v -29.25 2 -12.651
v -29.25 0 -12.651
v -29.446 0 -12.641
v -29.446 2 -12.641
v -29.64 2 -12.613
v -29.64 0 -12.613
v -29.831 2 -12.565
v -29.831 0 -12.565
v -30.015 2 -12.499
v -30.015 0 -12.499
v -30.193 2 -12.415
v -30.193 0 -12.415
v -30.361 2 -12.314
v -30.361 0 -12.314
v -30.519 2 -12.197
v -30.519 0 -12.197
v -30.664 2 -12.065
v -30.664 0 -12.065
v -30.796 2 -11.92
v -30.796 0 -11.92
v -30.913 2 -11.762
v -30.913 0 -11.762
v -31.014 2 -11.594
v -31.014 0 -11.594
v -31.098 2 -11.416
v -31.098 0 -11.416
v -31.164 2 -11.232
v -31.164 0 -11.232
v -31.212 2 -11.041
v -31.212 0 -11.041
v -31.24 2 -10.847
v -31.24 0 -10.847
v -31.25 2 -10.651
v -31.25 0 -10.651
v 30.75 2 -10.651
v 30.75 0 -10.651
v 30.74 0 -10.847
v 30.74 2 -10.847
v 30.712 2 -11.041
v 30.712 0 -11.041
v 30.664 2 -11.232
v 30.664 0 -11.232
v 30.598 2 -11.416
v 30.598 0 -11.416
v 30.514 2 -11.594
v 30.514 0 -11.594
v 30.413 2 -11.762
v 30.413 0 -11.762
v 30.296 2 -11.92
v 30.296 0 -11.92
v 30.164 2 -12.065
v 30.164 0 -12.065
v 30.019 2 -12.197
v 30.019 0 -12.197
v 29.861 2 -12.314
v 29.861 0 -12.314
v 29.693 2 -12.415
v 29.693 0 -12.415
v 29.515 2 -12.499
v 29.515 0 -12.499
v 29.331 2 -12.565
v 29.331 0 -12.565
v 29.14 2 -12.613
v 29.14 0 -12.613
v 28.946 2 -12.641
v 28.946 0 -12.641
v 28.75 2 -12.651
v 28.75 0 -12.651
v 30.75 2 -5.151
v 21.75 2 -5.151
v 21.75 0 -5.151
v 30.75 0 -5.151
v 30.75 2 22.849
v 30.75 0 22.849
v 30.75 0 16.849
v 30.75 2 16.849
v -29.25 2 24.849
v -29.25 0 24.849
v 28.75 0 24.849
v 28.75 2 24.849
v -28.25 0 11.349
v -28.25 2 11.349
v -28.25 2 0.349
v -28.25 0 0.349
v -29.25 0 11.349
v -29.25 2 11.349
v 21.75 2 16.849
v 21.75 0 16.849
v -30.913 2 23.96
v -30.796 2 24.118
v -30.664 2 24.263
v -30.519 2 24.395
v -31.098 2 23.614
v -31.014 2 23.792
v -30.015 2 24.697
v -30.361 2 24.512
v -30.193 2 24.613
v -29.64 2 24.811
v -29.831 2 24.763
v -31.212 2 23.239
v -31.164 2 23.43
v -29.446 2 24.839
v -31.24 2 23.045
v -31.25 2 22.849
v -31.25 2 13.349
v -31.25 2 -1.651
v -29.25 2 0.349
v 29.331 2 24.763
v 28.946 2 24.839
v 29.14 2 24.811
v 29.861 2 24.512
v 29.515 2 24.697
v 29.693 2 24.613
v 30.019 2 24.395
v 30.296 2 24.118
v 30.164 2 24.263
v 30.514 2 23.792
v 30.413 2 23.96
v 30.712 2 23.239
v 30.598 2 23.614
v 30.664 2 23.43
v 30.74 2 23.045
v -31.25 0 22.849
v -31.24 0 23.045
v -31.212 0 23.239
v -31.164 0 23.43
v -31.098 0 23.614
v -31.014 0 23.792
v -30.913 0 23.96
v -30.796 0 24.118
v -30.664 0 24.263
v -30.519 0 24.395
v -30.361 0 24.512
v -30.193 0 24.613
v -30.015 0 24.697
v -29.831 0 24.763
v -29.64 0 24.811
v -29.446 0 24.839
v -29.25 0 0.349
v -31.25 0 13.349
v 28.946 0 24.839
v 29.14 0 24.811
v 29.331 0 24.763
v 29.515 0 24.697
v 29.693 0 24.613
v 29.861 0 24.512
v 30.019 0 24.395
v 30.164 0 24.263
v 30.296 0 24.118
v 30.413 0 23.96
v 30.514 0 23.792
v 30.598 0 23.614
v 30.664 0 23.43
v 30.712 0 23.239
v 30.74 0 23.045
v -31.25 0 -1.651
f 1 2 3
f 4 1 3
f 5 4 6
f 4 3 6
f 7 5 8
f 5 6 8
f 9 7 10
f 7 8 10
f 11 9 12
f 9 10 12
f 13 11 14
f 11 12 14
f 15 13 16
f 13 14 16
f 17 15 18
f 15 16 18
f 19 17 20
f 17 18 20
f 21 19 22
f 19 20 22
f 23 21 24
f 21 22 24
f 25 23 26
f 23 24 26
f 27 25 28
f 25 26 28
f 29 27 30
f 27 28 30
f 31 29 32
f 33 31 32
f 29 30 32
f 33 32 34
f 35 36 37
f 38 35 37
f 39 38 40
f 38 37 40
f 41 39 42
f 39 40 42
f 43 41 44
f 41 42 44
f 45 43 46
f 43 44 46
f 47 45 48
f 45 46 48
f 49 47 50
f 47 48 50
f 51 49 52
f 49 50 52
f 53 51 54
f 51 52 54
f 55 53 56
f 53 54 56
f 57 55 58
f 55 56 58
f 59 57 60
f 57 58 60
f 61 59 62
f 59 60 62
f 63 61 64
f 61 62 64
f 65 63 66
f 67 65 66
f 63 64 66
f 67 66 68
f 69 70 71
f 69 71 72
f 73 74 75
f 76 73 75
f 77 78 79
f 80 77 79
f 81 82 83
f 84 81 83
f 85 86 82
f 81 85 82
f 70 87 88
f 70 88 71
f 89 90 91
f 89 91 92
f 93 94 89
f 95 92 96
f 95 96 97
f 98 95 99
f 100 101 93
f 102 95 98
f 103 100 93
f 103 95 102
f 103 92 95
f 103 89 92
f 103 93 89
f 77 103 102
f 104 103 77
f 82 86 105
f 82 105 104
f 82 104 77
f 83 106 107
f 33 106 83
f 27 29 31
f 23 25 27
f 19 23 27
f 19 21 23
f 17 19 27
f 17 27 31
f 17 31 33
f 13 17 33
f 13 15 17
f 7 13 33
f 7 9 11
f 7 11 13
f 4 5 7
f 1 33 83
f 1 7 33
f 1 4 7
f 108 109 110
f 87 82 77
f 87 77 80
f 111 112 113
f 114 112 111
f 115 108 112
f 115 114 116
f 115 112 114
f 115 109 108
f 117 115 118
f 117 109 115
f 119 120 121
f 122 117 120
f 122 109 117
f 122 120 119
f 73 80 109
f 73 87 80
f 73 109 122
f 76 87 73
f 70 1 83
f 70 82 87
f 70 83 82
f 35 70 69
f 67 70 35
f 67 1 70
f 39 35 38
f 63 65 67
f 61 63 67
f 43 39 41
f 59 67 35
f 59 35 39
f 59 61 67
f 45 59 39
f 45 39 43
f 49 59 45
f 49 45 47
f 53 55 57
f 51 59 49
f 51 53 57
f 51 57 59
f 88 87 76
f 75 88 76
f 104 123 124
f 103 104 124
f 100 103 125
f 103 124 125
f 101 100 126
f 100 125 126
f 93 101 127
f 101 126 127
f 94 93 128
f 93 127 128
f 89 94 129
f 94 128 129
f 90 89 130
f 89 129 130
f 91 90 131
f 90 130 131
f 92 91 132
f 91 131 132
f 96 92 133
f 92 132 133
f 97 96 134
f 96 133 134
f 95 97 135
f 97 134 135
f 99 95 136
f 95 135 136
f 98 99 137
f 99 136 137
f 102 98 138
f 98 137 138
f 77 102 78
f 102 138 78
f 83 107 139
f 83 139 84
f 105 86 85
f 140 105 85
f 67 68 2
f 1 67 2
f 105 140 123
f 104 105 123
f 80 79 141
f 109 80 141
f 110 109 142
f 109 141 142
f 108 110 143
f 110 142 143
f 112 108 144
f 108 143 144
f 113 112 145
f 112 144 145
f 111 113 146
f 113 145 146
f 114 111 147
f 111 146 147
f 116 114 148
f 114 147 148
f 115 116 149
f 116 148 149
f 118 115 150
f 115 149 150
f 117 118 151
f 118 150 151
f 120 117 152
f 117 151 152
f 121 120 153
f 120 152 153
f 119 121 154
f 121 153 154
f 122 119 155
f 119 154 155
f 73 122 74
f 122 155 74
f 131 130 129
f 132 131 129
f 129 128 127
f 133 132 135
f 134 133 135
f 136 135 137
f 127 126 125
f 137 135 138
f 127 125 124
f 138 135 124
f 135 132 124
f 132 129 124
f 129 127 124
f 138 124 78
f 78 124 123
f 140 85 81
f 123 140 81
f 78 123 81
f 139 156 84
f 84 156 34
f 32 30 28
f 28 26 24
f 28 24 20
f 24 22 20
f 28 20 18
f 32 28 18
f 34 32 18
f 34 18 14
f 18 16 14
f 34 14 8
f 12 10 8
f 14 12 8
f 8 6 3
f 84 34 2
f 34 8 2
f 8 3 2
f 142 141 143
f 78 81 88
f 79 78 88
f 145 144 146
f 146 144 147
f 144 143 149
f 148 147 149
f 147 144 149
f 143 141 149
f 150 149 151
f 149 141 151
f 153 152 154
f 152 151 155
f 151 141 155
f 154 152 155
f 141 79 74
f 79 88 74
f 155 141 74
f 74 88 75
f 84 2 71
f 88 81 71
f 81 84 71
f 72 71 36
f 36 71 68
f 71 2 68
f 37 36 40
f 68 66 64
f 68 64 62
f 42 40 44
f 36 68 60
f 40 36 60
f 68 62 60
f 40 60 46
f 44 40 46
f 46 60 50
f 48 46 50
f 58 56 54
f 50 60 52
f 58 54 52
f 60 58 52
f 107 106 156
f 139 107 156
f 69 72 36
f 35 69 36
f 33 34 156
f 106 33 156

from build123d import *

# Parameters (mm, degrees)
BOSS_EXTRUDE1_DEPTH = 2
SKETCH3_W           = 3
SKETCH3_H           = 11
CUT_EXTRUDE1_DEPTH  = 2
CHAMFER1_SIZE       = 2
SKETCH4_W           = 9
SKETCH4_H           = 22
CUT_EXTRUDE2_DEPTH  = 2


with BuildPart() as part:
    # Sketch1 → Boss-Extrude1 (new body)
    with BuildSketch(Plane(origin=(0, 0, 0), x_dir=(1, 0, 0), z_dir=(0, 1, 0))):
        with BuildLine():
            Line((-29.25, -24.848942598), (28.75, -24.848942598))
            ThreePointArc((28.75, -24.848942598), (30.164213562, -24.263156161), (30.75, -22.848942598))
            Line((30.75, -22.848942598), (30.75, 10.651057402))
            ThreePointArc((30.75, 10.651057402), (30.164213562, 12.065270964), (28.75, 12.651057402))
            Line((28.75, 12.651057402), (-29.25, 12.651057402))
            ThreePointArc((-29.25, 12.651057402), (-30.664213562, 12.065270964), (-31.25, 10.651057402))
            Line((-31.25, 10.651057402), (-31.25, -22.848942598))
            ThreePointArc((-31.25, -22.848942598), (-30.664213562, -24.263156161), (-29.25, -24.848942598))
        make_face()
    extrude(amount=BOSS_EXTRUDE1_DEPTH)

    # Sketch3 → Cut-Extrude1 (cut)
    with BuildSketch(Plane(origin=(0, 2, 0), x_dir=(1, 0, 0), z_dir=(0, 1, 0))):
        with Locations((-29.75, -5.848942598)):
            Rectangle(SKETCH3_W, SKETCH3_H)
    extrude(amount=-CUT_EXTRUDE1_DEPTH, mode=Mode.SUBTRACT)

    # Chamfer1
    chamfer1_edges = [part.edges().sort_by_distance(p)[0] for p in [
        (-31.25, 1, 11.348942598),
        (-31.25, 1, 0.348942598),
    ]]
    chamfer(chamfer1_edges, length=CHAMFER1_SIZE)

    # Sketch4 → Cut-Extrude2 (cut)
    with BuildSketch(Plane(origin=(0, 2, 0), x_dir=(1, 0, 0), z_dir=(0, 1, 0))):
        with Locations((26.25, -5.848942598)):
            Rectangle(SKETCH4_W, SKETCH4_H)
    extrude(amount=-CUT_EXTRUDE2_DEPTH, mode=Mode.SUBTRACT)


solid = part.part
